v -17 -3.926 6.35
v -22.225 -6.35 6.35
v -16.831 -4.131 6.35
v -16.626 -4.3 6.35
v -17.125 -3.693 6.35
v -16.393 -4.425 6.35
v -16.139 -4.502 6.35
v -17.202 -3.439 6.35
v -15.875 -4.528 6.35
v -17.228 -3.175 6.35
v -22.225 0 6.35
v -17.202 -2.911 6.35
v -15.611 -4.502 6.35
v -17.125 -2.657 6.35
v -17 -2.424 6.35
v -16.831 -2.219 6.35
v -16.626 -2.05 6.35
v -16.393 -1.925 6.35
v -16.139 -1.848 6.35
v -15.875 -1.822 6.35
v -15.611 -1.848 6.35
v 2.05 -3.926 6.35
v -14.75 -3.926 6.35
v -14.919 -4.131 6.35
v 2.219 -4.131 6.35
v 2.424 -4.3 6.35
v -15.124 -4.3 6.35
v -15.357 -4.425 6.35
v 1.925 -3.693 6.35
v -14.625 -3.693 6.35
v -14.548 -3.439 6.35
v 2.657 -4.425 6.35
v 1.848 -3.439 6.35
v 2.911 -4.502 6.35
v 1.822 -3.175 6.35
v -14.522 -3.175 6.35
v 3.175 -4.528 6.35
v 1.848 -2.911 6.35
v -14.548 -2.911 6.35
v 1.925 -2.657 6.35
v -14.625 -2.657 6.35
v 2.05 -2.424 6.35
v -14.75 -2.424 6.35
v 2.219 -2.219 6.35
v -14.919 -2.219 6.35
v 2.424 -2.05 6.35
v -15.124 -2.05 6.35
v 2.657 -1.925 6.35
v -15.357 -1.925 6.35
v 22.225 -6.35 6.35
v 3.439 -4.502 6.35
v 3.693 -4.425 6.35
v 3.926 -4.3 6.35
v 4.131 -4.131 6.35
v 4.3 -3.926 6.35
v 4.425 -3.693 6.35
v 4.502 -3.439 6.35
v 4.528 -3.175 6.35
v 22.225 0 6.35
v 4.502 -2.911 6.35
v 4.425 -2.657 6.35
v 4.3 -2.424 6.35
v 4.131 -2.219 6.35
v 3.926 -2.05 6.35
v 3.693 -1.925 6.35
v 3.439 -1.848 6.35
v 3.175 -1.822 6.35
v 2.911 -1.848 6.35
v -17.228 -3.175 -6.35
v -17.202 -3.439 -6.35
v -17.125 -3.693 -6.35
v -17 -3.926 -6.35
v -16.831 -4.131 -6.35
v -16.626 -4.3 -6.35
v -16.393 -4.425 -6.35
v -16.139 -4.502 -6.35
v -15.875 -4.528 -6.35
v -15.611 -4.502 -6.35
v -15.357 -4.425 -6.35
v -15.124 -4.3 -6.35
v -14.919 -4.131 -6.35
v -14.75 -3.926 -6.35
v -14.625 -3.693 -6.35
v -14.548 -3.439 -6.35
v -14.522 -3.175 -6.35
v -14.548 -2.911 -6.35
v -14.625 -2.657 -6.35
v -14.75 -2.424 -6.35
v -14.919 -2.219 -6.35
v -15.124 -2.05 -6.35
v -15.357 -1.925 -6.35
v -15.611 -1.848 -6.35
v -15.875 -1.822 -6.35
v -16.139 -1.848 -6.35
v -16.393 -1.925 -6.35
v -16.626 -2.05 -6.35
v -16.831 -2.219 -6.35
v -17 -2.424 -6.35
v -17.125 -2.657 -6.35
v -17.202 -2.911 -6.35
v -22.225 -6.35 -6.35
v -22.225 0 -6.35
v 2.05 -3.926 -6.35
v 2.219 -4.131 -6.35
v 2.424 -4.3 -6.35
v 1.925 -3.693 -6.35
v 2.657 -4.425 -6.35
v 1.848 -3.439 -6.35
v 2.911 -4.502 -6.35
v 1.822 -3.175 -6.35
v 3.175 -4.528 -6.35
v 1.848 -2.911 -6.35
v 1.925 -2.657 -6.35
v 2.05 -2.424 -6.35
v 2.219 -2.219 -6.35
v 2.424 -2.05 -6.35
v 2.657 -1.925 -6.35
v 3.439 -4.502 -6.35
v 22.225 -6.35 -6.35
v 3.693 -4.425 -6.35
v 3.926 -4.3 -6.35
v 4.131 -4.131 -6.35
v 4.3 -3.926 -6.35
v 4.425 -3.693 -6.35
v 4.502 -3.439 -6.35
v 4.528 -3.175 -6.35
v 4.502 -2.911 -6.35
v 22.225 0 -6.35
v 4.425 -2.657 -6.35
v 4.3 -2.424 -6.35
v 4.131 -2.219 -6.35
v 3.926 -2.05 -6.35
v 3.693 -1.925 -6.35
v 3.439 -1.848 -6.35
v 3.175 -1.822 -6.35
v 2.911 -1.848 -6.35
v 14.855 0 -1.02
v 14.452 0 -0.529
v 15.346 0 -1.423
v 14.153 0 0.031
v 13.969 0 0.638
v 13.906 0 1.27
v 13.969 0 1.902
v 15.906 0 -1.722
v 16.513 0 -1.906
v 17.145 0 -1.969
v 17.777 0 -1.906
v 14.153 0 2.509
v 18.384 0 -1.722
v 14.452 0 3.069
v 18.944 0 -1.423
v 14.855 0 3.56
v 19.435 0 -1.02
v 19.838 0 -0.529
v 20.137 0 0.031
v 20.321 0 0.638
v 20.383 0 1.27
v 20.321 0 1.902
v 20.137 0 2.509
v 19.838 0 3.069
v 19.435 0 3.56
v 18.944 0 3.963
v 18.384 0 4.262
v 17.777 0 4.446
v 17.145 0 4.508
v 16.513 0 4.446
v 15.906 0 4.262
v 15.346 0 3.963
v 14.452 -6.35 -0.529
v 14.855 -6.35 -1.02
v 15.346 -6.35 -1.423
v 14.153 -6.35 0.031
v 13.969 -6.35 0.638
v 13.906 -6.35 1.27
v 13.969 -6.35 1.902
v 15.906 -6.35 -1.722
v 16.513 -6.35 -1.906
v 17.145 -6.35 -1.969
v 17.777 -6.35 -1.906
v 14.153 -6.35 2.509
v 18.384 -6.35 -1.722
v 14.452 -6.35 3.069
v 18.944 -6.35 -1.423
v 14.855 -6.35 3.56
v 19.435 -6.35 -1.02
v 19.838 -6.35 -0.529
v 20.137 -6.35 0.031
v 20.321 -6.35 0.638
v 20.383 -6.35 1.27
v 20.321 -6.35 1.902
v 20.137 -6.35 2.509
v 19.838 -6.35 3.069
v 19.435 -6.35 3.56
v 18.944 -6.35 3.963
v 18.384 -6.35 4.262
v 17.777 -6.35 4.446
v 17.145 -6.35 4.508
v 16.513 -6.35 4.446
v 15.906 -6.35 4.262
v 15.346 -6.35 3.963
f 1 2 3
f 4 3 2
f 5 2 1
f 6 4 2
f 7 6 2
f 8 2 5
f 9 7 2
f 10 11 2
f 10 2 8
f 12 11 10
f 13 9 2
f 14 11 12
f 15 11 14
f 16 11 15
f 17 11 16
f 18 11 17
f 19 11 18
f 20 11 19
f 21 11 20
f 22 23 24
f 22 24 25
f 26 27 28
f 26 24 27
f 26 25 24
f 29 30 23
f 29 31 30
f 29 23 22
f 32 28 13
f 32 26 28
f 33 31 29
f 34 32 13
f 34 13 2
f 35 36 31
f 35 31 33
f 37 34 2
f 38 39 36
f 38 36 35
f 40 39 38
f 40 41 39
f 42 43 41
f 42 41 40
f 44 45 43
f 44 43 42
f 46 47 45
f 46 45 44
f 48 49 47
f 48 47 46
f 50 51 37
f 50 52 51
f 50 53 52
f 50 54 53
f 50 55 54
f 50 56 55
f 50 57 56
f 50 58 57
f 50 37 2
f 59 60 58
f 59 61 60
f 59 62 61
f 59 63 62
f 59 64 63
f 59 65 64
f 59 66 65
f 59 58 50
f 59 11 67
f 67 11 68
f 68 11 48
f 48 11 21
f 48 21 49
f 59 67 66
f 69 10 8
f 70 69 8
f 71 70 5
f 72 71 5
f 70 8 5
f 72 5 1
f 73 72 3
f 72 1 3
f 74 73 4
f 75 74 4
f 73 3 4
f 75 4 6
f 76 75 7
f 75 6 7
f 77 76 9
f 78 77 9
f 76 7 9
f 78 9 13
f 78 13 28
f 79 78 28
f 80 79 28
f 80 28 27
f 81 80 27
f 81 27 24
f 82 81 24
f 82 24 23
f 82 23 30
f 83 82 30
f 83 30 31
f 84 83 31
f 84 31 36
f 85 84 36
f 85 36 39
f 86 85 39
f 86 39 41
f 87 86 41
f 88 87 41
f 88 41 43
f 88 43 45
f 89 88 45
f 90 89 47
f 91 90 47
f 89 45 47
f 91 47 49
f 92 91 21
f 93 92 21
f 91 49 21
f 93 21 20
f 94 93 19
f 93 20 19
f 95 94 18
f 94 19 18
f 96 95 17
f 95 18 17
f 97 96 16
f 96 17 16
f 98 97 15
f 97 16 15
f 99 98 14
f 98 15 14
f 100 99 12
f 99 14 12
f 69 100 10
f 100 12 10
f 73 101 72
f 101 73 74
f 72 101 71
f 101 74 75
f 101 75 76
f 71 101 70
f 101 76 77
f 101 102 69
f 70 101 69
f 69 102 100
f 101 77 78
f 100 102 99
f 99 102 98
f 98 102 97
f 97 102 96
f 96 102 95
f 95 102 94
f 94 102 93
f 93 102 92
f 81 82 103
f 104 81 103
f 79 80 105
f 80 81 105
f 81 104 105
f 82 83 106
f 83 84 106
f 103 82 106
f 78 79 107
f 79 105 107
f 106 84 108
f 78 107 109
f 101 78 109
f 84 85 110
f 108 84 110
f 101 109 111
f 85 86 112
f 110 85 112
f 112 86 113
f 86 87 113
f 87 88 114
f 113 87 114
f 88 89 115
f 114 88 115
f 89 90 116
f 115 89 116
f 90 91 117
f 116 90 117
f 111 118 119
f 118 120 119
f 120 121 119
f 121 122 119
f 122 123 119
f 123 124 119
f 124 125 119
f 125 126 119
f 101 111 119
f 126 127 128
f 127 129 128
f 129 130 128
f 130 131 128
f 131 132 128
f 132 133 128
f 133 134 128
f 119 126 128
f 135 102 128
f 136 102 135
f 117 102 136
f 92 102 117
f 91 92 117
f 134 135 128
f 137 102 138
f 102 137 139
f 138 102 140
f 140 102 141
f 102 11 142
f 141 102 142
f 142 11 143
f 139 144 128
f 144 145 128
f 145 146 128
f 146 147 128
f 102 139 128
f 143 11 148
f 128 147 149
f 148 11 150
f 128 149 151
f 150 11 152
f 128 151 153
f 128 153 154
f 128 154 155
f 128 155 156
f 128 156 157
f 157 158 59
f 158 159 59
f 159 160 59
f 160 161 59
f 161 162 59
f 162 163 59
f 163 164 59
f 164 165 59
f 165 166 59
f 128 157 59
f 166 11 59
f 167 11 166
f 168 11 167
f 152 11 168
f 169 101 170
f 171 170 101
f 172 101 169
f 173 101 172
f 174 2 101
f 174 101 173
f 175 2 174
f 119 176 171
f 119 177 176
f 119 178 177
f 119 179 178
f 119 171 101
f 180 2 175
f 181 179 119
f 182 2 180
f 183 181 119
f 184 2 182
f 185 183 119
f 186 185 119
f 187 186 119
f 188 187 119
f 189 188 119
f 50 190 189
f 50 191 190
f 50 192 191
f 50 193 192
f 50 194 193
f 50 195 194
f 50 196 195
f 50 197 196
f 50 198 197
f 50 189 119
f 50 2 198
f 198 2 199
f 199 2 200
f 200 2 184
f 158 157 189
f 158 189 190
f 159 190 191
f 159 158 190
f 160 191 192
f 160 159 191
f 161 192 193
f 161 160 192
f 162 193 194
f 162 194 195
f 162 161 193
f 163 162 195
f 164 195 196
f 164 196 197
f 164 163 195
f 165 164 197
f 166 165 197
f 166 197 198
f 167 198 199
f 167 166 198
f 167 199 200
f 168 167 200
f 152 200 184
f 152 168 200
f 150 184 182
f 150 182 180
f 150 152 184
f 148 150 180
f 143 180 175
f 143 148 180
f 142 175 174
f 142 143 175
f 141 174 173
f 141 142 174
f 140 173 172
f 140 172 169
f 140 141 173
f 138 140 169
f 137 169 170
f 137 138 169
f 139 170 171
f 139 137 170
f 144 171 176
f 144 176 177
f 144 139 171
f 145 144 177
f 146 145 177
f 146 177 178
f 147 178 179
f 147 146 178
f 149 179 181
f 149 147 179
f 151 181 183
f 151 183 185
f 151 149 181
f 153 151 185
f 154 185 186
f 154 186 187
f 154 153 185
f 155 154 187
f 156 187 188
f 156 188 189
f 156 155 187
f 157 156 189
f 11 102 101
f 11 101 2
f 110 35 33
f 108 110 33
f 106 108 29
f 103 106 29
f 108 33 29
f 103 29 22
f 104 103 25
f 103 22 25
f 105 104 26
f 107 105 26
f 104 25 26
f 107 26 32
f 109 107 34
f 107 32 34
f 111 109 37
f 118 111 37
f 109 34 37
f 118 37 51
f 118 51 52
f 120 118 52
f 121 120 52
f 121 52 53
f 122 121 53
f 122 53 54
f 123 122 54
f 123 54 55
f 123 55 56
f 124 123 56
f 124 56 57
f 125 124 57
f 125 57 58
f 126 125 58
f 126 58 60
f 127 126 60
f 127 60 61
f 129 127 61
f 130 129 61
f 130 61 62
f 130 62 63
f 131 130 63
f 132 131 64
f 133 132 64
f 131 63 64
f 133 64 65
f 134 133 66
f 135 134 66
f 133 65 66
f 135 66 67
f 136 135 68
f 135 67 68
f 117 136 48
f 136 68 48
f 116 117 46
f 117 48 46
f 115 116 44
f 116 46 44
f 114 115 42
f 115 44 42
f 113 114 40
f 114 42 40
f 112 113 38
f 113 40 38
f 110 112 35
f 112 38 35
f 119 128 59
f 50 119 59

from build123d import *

# Parameters (mm, degrees)
F0_W     = 44.45
F0_H     = 12.7
F0_R     = 3.2385
F1_DEPTH = 6.35
F3_D     = 2.7051


with BuildPart() as f1:
    # F0 (on Front) → F1 (new body)
    with BuildSketch(Plane.XZ):
        Rectangle(F0_W, F0_H)
        with Locations((17.145, 1.27)):
            Circle(F0_R, mode=Mode.SUBTRACT)
    extrude(amount=F1_DEPTH)

    # F3 (through all)
    with Locations(Plane(origin=(0, 0, -6.35), x_dir=(1, 0, 0), z_dir=(0, 0, -1))):
        with Locations((-15.875, 3.175), (3.175, 3.175)):
            Hole(F3_D / 2)


solid = f1.part
